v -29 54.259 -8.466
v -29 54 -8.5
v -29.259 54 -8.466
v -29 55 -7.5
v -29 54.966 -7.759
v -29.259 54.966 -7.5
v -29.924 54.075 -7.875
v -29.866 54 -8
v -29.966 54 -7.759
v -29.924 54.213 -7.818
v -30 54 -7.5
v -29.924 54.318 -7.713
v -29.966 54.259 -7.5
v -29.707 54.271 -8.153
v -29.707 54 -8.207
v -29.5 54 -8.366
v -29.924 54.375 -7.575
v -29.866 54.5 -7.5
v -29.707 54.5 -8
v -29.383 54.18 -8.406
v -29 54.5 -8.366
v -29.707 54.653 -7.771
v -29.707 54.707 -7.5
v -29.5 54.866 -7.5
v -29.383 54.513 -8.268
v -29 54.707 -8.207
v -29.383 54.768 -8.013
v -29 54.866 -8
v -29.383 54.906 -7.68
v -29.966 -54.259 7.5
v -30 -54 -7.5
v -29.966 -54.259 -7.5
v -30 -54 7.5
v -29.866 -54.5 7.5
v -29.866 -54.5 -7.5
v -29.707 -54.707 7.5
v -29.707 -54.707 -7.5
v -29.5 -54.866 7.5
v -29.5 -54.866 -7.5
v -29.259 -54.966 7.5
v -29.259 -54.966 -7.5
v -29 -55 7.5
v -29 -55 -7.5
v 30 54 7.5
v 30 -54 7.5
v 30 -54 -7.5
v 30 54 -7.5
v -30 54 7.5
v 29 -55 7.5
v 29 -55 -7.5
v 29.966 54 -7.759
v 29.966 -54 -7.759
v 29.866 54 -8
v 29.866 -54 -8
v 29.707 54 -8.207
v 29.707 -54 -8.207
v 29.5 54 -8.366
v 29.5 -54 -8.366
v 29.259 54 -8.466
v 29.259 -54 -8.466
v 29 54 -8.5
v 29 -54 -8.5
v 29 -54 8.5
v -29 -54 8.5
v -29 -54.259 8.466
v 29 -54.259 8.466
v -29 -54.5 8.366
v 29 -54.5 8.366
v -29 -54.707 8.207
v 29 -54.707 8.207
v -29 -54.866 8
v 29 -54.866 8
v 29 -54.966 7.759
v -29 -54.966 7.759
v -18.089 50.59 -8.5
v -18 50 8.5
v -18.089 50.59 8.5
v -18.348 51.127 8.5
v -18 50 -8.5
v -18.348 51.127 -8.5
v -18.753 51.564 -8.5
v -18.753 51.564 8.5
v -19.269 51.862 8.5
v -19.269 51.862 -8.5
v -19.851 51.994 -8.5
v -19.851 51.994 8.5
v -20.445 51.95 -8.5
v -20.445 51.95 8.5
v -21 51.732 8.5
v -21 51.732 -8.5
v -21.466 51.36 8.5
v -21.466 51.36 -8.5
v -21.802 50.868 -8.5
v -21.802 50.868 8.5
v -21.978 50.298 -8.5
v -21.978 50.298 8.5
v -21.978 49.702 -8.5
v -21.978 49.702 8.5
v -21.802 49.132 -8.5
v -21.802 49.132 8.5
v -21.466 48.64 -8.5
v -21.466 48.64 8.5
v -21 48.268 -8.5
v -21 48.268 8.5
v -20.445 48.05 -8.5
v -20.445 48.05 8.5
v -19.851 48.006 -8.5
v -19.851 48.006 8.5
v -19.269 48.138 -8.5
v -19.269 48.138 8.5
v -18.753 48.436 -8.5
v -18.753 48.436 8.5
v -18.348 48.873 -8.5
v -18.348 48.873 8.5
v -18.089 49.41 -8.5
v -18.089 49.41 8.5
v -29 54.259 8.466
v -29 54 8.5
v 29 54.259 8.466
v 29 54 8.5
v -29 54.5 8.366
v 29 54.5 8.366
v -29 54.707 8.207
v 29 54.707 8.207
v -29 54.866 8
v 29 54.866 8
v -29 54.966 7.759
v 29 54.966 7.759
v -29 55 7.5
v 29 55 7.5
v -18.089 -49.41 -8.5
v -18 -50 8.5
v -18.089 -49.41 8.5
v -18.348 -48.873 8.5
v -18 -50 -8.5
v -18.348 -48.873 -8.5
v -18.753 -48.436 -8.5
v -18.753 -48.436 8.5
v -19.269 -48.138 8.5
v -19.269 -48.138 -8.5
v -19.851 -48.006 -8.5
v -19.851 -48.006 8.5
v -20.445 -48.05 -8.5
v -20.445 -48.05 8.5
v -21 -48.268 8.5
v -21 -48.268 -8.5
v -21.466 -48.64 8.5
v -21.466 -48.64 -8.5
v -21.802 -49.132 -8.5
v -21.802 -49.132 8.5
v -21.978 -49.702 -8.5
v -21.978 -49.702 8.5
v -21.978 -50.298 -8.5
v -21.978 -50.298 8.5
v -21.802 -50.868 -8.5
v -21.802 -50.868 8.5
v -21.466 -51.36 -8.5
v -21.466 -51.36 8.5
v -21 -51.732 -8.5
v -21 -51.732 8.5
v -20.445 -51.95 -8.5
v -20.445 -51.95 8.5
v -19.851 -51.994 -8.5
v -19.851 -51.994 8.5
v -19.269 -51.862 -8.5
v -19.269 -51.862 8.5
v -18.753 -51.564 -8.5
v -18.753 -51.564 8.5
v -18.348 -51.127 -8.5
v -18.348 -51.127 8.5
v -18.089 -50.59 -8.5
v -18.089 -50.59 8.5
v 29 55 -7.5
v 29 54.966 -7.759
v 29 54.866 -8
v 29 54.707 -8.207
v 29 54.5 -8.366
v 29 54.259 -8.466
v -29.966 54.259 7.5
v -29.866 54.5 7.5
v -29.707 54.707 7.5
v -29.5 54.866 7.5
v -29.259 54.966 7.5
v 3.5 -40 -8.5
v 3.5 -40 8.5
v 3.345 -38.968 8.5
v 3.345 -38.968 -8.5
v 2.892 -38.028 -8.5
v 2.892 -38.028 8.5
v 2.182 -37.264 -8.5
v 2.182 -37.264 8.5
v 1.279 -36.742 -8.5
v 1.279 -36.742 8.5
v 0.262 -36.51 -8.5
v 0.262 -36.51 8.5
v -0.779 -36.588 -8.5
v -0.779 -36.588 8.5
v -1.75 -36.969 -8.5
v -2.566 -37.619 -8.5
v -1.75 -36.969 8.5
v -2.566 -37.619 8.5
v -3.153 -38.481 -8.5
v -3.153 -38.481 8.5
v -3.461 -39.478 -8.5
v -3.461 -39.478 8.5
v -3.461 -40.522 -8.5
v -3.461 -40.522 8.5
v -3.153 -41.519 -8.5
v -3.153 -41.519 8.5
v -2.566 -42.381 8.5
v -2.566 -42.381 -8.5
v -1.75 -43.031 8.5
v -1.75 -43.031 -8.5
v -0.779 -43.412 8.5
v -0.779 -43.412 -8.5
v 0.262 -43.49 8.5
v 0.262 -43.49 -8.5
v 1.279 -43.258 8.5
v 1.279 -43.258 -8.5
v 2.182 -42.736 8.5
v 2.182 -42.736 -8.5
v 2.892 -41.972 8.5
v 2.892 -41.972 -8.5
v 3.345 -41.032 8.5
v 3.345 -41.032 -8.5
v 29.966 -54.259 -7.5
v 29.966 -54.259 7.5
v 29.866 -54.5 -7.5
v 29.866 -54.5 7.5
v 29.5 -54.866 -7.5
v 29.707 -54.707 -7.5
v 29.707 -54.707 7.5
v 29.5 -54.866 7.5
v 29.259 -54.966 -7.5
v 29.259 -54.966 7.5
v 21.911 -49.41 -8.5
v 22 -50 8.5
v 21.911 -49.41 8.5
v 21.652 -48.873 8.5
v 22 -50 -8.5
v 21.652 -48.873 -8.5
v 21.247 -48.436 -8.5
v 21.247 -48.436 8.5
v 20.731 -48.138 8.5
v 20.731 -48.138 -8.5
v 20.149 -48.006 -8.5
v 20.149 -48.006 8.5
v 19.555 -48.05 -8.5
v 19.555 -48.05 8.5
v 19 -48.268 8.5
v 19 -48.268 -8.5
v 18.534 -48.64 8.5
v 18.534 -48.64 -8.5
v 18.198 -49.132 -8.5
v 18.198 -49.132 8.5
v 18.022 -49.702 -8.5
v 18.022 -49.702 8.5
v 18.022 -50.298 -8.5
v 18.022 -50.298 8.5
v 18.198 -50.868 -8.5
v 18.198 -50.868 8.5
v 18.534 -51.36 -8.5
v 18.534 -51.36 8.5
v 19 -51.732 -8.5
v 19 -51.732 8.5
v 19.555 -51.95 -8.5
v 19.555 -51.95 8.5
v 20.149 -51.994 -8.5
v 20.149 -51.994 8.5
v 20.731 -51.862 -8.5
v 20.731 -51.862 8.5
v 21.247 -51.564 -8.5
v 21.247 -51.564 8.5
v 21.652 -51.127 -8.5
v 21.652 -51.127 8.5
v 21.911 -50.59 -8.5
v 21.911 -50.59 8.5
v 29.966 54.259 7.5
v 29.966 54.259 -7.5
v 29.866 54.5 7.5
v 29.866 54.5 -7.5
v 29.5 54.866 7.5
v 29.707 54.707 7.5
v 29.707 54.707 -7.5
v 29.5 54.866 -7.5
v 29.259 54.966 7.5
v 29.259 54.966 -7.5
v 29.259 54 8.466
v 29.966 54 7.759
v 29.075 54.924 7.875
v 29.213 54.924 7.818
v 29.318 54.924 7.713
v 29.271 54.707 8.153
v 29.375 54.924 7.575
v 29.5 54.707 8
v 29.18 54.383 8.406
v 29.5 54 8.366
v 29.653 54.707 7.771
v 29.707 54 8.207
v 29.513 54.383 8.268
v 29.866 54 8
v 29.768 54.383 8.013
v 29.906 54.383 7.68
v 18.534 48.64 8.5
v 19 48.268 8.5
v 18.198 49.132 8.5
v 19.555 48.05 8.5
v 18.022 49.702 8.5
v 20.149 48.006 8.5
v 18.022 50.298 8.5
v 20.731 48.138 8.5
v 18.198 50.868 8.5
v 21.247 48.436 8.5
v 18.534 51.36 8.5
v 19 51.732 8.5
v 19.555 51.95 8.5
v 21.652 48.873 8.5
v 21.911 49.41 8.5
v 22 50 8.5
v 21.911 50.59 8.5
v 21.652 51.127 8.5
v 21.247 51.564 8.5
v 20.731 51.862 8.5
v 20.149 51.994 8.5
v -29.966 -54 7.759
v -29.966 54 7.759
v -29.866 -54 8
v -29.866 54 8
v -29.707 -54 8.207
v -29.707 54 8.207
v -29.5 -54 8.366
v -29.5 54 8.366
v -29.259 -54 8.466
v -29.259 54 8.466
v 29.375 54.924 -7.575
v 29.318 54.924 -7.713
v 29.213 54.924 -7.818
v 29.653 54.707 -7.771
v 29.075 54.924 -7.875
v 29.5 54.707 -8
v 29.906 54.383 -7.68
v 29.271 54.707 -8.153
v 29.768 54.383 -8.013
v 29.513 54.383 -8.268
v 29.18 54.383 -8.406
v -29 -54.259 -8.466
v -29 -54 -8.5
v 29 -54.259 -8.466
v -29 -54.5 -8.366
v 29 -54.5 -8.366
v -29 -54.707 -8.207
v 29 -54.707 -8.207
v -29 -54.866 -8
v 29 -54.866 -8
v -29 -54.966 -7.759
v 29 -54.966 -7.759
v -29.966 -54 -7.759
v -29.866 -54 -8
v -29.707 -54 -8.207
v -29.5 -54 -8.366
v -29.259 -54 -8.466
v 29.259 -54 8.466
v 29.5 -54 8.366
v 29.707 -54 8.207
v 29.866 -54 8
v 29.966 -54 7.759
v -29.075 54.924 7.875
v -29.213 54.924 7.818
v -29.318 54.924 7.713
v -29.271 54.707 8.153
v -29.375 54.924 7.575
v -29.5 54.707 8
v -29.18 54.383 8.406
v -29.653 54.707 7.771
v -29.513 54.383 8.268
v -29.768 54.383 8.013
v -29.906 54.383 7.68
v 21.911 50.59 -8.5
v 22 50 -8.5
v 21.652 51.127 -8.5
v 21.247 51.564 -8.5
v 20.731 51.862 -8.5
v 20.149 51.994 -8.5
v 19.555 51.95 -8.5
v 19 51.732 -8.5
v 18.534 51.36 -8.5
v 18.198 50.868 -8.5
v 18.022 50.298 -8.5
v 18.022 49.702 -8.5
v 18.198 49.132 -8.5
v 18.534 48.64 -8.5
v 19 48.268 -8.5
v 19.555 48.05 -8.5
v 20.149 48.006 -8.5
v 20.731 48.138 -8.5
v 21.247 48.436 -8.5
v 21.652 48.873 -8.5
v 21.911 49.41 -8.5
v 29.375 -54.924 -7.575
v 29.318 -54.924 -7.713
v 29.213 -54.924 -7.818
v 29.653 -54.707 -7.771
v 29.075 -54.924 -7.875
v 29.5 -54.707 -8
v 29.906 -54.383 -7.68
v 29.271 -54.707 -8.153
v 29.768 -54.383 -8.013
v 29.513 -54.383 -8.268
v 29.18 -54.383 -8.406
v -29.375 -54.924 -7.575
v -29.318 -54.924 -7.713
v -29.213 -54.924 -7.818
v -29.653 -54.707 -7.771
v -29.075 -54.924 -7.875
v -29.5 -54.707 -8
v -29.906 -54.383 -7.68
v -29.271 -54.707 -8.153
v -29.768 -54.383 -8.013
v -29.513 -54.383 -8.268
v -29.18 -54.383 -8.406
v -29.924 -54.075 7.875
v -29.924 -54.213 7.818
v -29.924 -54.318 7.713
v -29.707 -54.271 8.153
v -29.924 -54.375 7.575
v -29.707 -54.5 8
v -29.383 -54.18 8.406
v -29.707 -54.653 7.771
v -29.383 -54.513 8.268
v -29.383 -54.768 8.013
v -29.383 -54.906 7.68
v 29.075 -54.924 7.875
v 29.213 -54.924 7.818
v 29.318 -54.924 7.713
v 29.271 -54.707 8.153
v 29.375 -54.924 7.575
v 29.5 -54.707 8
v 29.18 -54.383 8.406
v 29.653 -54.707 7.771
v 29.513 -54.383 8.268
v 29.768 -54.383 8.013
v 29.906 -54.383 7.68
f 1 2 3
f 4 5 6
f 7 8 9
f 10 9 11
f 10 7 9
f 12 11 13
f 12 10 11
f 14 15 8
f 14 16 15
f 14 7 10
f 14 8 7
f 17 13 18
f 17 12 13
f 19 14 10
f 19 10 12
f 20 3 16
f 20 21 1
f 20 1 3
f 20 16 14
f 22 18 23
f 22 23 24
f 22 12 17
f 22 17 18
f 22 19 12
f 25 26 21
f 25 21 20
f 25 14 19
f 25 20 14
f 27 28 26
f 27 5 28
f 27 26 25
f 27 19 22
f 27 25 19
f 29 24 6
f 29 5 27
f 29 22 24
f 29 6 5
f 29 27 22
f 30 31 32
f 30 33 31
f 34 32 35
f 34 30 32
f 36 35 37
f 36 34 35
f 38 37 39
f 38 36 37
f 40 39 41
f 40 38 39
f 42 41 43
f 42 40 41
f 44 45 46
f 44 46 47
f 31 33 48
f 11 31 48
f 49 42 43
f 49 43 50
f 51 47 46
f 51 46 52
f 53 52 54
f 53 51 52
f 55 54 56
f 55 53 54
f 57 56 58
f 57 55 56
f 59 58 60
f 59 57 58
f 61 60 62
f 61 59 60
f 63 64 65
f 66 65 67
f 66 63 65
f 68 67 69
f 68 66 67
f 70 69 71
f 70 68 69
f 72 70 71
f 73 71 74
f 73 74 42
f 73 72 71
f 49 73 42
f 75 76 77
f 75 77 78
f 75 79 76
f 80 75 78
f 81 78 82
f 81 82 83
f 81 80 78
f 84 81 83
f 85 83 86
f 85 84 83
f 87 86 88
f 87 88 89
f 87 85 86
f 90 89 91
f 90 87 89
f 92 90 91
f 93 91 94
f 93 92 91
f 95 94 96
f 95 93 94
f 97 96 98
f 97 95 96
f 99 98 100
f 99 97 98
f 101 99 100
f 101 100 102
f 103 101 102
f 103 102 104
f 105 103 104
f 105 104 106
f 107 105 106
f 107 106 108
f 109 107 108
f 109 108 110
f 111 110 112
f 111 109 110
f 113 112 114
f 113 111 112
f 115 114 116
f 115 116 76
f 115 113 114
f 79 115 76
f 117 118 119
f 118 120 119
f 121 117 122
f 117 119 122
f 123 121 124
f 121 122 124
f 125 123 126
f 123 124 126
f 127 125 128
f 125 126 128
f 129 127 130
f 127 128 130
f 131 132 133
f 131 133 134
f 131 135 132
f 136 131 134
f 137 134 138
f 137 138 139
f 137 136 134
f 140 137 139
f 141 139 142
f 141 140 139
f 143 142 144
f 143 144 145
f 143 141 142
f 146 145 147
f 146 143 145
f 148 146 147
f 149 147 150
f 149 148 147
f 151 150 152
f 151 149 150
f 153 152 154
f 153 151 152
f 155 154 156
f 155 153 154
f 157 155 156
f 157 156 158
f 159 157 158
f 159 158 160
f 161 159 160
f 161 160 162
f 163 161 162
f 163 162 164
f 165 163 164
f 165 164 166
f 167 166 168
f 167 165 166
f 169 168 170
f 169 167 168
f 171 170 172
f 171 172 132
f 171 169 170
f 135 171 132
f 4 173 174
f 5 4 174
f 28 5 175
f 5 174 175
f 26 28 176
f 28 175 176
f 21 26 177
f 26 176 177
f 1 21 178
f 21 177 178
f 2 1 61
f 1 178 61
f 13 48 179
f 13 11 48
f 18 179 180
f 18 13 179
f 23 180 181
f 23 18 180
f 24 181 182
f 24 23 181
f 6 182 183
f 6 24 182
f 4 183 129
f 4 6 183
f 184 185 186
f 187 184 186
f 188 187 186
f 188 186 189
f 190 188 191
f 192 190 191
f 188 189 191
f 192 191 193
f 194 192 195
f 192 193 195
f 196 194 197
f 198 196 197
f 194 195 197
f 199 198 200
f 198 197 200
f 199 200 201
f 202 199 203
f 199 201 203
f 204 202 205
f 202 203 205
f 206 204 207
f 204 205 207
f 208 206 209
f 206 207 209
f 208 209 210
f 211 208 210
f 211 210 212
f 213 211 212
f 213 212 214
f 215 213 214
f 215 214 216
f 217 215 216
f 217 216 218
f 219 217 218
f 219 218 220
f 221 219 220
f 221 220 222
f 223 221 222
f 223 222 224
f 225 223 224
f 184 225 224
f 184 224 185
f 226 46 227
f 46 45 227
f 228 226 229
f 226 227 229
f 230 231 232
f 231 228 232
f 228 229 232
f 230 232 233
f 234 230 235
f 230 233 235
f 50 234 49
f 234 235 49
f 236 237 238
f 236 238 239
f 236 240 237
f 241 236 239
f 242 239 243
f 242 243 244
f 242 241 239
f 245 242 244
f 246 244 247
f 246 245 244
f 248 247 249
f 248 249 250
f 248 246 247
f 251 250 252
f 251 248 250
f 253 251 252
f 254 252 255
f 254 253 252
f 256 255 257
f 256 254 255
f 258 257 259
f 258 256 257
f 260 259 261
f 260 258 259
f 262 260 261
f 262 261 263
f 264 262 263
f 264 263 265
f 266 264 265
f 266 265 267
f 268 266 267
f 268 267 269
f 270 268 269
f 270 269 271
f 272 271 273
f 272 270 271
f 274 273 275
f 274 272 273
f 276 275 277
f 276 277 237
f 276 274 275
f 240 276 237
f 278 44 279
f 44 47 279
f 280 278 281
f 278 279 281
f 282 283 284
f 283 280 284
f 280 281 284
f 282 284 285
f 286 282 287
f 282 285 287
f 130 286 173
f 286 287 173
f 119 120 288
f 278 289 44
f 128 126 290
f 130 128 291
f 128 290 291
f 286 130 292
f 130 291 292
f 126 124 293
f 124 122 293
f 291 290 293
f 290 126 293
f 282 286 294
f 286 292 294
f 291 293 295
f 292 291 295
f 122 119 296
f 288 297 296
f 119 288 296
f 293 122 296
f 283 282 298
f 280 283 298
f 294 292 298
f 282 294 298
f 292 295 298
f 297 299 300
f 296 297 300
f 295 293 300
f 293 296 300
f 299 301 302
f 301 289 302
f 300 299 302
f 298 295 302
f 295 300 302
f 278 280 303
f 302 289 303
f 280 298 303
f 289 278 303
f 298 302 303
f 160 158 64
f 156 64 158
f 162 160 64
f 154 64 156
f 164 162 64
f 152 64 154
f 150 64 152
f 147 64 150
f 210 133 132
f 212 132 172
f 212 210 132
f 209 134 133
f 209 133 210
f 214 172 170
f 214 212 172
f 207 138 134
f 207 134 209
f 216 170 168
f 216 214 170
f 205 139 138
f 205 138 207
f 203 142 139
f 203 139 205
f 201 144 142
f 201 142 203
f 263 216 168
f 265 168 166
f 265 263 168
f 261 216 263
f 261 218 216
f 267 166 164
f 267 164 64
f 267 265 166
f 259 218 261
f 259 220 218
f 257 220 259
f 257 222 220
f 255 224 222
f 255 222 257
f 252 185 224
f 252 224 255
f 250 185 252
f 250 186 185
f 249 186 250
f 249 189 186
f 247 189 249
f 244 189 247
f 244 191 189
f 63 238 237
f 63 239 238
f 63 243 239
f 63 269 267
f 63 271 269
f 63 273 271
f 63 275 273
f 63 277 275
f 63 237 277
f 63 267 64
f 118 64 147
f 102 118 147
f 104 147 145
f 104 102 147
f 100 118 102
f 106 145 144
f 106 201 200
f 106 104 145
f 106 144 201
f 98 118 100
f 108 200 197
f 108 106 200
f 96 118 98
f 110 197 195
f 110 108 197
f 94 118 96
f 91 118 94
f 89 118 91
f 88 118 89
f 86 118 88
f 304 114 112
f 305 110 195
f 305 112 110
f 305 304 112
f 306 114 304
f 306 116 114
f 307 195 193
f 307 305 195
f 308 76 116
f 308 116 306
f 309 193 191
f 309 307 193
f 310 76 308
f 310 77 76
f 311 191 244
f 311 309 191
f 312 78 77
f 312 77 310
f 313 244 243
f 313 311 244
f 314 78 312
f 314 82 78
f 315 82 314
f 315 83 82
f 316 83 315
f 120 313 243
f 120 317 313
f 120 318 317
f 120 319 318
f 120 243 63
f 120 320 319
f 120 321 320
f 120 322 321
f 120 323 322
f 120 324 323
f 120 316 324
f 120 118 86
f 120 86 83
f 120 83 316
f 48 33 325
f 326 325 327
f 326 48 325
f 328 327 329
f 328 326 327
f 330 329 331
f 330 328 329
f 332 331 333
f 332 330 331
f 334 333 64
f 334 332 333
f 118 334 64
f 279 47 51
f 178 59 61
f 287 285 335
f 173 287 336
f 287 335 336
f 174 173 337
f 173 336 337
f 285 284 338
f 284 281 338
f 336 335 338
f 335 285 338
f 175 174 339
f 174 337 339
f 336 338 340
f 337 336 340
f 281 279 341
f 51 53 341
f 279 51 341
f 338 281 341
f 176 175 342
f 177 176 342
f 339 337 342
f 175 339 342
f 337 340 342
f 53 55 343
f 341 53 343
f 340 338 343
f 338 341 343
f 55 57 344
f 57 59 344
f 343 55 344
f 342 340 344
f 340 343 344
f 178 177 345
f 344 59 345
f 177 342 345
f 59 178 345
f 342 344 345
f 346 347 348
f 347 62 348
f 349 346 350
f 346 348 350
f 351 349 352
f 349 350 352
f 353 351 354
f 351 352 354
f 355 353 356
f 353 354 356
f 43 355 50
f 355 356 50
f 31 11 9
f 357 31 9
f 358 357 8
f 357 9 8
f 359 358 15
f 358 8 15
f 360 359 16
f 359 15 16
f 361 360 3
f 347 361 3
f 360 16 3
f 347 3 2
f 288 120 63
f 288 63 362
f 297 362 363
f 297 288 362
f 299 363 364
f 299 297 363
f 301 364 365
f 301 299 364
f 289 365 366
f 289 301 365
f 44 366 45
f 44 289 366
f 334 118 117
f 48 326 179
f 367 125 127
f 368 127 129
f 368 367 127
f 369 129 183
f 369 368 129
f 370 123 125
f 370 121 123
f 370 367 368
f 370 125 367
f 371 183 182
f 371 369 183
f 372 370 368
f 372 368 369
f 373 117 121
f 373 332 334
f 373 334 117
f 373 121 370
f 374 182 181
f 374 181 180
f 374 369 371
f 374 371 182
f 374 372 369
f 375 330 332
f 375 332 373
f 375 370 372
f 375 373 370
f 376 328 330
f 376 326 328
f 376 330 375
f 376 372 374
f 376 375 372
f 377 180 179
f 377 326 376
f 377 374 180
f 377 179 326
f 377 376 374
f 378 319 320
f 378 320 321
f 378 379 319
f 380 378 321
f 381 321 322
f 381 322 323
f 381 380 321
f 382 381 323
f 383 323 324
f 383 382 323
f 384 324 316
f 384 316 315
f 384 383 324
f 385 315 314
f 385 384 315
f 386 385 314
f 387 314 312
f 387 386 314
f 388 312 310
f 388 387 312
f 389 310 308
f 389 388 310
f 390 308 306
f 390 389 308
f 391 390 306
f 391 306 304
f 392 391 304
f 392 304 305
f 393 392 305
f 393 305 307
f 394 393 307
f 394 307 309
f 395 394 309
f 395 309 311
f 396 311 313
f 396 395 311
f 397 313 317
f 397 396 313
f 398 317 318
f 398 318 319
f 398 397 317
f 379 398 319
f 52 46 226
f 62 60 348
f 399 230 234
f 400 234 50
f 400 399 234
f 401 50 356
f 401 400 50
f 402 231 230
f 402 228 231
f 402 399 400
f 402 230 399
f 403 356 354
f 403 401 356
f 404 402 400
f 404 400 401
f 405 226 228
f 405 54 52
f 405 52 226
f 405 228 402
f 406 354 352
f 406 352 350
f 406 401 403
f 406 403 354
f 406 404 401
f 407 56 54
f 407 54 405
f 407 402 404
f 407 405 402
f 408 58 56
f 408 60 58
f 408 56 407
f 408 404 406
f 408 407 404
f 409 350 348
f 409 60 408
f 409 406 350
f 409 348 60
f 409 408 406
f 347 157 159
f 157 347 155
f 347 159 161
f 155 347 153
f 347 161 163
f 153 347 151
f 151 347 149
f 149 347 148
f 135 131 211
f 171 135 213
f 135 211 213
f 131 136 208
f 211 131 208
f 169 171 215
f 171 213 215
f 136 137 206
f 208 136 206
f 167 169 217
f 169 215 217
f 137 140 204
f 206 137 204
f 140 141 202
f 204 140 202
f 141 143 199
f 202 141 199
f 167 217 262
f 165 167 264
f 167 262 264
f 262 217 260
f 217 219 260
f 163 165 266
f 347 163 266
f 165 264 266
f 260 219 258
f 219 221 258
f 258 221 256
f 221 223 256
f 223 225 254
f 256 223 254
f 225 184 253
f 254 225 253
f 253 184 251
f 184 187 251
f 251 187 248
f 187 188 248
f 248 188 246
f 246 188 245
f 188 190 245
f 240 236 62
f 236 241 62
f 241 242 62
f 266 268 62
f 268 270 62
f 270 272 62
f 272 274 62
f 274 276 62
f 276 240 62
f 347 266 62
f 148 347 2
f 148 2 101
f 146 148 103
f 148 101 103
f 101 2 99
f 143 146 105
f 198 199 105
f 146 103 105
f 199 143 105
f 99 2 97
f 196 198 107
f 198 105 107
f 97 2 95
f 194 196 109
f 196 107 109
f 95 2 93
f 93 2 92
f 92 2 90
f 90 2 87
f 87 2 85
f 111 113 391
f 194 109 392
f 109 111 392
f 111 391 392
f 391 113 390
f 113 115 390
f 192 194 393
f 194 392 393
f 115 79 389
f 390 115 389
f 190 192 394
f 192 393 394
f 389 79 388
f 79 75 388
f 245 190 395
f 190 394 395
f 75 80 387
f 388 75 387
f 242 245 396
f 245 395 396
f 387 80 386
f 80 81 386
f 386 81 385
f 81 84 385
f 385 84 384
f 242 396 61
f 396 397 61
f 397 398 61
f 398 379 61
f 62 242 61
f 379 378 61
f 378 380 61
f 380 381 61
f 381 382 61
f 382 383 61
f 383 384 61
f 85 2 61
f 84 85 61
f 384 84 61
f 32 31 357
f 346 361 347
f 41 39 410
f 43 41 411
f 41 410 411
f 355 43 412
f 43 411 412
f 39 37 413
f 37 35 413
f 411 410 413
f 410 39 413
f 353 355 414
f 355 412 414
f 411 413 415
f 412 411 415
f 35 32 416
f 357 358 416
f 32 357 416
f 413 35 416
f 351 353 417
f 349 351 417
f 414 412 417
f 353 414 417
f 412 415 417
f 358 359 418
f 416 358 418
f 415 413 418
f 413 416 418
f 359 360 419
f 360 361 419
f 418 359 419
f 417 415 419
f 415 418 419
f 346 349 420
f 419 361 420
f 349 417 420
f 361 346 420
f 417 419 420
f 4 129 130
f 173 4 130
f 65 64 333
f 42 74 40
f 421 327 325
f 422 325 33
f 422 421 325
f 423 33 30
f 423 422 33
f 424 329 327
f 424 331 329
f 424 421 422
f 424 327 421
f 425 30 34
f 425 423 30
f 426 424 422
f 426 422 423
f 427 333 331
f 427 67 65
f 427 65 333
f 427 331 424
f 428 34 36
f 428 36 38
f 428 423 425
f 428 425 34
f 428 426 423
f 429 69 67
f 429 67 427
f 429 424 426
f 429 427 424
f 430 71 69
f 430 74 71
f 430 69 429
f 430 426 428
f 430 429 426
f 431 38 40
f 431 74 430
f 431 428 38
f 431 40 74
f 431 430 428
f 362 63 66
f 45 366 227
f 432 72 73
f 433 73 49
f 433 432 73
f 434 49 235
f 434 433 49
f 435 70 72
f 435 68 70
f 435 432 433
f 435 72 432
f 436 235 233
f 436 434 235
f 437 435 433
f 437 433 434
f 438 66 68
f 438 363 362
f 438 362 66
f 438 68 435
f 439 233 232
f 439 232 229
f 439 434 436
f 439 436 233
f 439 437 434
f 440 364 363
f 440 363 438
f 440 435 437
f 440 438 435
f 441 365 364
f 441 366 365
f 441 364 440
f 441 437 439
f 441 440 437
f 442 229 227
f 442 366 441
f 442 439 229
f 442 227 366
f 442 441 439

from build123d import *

# Parameters (mm, degrees)
F0_W     = 60
F0_H     = 110
F0_R     = 2
F1_DEPTH = 8.5
F2_R     = 1
F3_R     = 3.5
F4_DEPTH = 25


with BuildPart() as f1:
    # F0 (on Top) → F1 (new body, symmetric)
    with BuildSketch(Plane.XY):
        Rectangle(F0_W, F0_H)
        with Locations((-20, -50)):
            Circle(F0_R, mode=Mode.SUBTRACT)
        with Locations((20, -50)):
            Circle(F0_R, mode=Mode.SUBTRACT)
        with Locations((-20, 50)):
            Circle(F0_R, mode=Mode.SUBTRACT)
        with Locations((20, 50)):
            Circle(F0_R, mode=Mode.SUBTRACT)
    extrude(amount=F1_DEPTH, both=True)

    # F2
    f2_edges = [f1.edges().sort_by_distance(p)[0] for p in [
        (30, 0, 8.5),
        (0, -55, 8.5),
        (-30, 0, 8.5),
        (0, 55, 8.5),
        (30, 0, -8.5),
        (30, -55, 0),
        (30, 55, 0),
        (0, 55, -8.5),
        (-30, 0, -8.5),
        (-30, 55, 0),
        (-30, -55, 0),
        (0, -55, -8.5),
    ]]
    fillet(f2_edges, radius=F2_R)

    # F3 (on face) → F4 (cut)
    with BuildSketch(Plane.XY.offset(8.5)):
        with Locations((0, -40)):
            Circle(F3_R)
    extrude(amount=-F4_DEPTH, mode=Mode.SUBTRACT)


solid = f1.part
